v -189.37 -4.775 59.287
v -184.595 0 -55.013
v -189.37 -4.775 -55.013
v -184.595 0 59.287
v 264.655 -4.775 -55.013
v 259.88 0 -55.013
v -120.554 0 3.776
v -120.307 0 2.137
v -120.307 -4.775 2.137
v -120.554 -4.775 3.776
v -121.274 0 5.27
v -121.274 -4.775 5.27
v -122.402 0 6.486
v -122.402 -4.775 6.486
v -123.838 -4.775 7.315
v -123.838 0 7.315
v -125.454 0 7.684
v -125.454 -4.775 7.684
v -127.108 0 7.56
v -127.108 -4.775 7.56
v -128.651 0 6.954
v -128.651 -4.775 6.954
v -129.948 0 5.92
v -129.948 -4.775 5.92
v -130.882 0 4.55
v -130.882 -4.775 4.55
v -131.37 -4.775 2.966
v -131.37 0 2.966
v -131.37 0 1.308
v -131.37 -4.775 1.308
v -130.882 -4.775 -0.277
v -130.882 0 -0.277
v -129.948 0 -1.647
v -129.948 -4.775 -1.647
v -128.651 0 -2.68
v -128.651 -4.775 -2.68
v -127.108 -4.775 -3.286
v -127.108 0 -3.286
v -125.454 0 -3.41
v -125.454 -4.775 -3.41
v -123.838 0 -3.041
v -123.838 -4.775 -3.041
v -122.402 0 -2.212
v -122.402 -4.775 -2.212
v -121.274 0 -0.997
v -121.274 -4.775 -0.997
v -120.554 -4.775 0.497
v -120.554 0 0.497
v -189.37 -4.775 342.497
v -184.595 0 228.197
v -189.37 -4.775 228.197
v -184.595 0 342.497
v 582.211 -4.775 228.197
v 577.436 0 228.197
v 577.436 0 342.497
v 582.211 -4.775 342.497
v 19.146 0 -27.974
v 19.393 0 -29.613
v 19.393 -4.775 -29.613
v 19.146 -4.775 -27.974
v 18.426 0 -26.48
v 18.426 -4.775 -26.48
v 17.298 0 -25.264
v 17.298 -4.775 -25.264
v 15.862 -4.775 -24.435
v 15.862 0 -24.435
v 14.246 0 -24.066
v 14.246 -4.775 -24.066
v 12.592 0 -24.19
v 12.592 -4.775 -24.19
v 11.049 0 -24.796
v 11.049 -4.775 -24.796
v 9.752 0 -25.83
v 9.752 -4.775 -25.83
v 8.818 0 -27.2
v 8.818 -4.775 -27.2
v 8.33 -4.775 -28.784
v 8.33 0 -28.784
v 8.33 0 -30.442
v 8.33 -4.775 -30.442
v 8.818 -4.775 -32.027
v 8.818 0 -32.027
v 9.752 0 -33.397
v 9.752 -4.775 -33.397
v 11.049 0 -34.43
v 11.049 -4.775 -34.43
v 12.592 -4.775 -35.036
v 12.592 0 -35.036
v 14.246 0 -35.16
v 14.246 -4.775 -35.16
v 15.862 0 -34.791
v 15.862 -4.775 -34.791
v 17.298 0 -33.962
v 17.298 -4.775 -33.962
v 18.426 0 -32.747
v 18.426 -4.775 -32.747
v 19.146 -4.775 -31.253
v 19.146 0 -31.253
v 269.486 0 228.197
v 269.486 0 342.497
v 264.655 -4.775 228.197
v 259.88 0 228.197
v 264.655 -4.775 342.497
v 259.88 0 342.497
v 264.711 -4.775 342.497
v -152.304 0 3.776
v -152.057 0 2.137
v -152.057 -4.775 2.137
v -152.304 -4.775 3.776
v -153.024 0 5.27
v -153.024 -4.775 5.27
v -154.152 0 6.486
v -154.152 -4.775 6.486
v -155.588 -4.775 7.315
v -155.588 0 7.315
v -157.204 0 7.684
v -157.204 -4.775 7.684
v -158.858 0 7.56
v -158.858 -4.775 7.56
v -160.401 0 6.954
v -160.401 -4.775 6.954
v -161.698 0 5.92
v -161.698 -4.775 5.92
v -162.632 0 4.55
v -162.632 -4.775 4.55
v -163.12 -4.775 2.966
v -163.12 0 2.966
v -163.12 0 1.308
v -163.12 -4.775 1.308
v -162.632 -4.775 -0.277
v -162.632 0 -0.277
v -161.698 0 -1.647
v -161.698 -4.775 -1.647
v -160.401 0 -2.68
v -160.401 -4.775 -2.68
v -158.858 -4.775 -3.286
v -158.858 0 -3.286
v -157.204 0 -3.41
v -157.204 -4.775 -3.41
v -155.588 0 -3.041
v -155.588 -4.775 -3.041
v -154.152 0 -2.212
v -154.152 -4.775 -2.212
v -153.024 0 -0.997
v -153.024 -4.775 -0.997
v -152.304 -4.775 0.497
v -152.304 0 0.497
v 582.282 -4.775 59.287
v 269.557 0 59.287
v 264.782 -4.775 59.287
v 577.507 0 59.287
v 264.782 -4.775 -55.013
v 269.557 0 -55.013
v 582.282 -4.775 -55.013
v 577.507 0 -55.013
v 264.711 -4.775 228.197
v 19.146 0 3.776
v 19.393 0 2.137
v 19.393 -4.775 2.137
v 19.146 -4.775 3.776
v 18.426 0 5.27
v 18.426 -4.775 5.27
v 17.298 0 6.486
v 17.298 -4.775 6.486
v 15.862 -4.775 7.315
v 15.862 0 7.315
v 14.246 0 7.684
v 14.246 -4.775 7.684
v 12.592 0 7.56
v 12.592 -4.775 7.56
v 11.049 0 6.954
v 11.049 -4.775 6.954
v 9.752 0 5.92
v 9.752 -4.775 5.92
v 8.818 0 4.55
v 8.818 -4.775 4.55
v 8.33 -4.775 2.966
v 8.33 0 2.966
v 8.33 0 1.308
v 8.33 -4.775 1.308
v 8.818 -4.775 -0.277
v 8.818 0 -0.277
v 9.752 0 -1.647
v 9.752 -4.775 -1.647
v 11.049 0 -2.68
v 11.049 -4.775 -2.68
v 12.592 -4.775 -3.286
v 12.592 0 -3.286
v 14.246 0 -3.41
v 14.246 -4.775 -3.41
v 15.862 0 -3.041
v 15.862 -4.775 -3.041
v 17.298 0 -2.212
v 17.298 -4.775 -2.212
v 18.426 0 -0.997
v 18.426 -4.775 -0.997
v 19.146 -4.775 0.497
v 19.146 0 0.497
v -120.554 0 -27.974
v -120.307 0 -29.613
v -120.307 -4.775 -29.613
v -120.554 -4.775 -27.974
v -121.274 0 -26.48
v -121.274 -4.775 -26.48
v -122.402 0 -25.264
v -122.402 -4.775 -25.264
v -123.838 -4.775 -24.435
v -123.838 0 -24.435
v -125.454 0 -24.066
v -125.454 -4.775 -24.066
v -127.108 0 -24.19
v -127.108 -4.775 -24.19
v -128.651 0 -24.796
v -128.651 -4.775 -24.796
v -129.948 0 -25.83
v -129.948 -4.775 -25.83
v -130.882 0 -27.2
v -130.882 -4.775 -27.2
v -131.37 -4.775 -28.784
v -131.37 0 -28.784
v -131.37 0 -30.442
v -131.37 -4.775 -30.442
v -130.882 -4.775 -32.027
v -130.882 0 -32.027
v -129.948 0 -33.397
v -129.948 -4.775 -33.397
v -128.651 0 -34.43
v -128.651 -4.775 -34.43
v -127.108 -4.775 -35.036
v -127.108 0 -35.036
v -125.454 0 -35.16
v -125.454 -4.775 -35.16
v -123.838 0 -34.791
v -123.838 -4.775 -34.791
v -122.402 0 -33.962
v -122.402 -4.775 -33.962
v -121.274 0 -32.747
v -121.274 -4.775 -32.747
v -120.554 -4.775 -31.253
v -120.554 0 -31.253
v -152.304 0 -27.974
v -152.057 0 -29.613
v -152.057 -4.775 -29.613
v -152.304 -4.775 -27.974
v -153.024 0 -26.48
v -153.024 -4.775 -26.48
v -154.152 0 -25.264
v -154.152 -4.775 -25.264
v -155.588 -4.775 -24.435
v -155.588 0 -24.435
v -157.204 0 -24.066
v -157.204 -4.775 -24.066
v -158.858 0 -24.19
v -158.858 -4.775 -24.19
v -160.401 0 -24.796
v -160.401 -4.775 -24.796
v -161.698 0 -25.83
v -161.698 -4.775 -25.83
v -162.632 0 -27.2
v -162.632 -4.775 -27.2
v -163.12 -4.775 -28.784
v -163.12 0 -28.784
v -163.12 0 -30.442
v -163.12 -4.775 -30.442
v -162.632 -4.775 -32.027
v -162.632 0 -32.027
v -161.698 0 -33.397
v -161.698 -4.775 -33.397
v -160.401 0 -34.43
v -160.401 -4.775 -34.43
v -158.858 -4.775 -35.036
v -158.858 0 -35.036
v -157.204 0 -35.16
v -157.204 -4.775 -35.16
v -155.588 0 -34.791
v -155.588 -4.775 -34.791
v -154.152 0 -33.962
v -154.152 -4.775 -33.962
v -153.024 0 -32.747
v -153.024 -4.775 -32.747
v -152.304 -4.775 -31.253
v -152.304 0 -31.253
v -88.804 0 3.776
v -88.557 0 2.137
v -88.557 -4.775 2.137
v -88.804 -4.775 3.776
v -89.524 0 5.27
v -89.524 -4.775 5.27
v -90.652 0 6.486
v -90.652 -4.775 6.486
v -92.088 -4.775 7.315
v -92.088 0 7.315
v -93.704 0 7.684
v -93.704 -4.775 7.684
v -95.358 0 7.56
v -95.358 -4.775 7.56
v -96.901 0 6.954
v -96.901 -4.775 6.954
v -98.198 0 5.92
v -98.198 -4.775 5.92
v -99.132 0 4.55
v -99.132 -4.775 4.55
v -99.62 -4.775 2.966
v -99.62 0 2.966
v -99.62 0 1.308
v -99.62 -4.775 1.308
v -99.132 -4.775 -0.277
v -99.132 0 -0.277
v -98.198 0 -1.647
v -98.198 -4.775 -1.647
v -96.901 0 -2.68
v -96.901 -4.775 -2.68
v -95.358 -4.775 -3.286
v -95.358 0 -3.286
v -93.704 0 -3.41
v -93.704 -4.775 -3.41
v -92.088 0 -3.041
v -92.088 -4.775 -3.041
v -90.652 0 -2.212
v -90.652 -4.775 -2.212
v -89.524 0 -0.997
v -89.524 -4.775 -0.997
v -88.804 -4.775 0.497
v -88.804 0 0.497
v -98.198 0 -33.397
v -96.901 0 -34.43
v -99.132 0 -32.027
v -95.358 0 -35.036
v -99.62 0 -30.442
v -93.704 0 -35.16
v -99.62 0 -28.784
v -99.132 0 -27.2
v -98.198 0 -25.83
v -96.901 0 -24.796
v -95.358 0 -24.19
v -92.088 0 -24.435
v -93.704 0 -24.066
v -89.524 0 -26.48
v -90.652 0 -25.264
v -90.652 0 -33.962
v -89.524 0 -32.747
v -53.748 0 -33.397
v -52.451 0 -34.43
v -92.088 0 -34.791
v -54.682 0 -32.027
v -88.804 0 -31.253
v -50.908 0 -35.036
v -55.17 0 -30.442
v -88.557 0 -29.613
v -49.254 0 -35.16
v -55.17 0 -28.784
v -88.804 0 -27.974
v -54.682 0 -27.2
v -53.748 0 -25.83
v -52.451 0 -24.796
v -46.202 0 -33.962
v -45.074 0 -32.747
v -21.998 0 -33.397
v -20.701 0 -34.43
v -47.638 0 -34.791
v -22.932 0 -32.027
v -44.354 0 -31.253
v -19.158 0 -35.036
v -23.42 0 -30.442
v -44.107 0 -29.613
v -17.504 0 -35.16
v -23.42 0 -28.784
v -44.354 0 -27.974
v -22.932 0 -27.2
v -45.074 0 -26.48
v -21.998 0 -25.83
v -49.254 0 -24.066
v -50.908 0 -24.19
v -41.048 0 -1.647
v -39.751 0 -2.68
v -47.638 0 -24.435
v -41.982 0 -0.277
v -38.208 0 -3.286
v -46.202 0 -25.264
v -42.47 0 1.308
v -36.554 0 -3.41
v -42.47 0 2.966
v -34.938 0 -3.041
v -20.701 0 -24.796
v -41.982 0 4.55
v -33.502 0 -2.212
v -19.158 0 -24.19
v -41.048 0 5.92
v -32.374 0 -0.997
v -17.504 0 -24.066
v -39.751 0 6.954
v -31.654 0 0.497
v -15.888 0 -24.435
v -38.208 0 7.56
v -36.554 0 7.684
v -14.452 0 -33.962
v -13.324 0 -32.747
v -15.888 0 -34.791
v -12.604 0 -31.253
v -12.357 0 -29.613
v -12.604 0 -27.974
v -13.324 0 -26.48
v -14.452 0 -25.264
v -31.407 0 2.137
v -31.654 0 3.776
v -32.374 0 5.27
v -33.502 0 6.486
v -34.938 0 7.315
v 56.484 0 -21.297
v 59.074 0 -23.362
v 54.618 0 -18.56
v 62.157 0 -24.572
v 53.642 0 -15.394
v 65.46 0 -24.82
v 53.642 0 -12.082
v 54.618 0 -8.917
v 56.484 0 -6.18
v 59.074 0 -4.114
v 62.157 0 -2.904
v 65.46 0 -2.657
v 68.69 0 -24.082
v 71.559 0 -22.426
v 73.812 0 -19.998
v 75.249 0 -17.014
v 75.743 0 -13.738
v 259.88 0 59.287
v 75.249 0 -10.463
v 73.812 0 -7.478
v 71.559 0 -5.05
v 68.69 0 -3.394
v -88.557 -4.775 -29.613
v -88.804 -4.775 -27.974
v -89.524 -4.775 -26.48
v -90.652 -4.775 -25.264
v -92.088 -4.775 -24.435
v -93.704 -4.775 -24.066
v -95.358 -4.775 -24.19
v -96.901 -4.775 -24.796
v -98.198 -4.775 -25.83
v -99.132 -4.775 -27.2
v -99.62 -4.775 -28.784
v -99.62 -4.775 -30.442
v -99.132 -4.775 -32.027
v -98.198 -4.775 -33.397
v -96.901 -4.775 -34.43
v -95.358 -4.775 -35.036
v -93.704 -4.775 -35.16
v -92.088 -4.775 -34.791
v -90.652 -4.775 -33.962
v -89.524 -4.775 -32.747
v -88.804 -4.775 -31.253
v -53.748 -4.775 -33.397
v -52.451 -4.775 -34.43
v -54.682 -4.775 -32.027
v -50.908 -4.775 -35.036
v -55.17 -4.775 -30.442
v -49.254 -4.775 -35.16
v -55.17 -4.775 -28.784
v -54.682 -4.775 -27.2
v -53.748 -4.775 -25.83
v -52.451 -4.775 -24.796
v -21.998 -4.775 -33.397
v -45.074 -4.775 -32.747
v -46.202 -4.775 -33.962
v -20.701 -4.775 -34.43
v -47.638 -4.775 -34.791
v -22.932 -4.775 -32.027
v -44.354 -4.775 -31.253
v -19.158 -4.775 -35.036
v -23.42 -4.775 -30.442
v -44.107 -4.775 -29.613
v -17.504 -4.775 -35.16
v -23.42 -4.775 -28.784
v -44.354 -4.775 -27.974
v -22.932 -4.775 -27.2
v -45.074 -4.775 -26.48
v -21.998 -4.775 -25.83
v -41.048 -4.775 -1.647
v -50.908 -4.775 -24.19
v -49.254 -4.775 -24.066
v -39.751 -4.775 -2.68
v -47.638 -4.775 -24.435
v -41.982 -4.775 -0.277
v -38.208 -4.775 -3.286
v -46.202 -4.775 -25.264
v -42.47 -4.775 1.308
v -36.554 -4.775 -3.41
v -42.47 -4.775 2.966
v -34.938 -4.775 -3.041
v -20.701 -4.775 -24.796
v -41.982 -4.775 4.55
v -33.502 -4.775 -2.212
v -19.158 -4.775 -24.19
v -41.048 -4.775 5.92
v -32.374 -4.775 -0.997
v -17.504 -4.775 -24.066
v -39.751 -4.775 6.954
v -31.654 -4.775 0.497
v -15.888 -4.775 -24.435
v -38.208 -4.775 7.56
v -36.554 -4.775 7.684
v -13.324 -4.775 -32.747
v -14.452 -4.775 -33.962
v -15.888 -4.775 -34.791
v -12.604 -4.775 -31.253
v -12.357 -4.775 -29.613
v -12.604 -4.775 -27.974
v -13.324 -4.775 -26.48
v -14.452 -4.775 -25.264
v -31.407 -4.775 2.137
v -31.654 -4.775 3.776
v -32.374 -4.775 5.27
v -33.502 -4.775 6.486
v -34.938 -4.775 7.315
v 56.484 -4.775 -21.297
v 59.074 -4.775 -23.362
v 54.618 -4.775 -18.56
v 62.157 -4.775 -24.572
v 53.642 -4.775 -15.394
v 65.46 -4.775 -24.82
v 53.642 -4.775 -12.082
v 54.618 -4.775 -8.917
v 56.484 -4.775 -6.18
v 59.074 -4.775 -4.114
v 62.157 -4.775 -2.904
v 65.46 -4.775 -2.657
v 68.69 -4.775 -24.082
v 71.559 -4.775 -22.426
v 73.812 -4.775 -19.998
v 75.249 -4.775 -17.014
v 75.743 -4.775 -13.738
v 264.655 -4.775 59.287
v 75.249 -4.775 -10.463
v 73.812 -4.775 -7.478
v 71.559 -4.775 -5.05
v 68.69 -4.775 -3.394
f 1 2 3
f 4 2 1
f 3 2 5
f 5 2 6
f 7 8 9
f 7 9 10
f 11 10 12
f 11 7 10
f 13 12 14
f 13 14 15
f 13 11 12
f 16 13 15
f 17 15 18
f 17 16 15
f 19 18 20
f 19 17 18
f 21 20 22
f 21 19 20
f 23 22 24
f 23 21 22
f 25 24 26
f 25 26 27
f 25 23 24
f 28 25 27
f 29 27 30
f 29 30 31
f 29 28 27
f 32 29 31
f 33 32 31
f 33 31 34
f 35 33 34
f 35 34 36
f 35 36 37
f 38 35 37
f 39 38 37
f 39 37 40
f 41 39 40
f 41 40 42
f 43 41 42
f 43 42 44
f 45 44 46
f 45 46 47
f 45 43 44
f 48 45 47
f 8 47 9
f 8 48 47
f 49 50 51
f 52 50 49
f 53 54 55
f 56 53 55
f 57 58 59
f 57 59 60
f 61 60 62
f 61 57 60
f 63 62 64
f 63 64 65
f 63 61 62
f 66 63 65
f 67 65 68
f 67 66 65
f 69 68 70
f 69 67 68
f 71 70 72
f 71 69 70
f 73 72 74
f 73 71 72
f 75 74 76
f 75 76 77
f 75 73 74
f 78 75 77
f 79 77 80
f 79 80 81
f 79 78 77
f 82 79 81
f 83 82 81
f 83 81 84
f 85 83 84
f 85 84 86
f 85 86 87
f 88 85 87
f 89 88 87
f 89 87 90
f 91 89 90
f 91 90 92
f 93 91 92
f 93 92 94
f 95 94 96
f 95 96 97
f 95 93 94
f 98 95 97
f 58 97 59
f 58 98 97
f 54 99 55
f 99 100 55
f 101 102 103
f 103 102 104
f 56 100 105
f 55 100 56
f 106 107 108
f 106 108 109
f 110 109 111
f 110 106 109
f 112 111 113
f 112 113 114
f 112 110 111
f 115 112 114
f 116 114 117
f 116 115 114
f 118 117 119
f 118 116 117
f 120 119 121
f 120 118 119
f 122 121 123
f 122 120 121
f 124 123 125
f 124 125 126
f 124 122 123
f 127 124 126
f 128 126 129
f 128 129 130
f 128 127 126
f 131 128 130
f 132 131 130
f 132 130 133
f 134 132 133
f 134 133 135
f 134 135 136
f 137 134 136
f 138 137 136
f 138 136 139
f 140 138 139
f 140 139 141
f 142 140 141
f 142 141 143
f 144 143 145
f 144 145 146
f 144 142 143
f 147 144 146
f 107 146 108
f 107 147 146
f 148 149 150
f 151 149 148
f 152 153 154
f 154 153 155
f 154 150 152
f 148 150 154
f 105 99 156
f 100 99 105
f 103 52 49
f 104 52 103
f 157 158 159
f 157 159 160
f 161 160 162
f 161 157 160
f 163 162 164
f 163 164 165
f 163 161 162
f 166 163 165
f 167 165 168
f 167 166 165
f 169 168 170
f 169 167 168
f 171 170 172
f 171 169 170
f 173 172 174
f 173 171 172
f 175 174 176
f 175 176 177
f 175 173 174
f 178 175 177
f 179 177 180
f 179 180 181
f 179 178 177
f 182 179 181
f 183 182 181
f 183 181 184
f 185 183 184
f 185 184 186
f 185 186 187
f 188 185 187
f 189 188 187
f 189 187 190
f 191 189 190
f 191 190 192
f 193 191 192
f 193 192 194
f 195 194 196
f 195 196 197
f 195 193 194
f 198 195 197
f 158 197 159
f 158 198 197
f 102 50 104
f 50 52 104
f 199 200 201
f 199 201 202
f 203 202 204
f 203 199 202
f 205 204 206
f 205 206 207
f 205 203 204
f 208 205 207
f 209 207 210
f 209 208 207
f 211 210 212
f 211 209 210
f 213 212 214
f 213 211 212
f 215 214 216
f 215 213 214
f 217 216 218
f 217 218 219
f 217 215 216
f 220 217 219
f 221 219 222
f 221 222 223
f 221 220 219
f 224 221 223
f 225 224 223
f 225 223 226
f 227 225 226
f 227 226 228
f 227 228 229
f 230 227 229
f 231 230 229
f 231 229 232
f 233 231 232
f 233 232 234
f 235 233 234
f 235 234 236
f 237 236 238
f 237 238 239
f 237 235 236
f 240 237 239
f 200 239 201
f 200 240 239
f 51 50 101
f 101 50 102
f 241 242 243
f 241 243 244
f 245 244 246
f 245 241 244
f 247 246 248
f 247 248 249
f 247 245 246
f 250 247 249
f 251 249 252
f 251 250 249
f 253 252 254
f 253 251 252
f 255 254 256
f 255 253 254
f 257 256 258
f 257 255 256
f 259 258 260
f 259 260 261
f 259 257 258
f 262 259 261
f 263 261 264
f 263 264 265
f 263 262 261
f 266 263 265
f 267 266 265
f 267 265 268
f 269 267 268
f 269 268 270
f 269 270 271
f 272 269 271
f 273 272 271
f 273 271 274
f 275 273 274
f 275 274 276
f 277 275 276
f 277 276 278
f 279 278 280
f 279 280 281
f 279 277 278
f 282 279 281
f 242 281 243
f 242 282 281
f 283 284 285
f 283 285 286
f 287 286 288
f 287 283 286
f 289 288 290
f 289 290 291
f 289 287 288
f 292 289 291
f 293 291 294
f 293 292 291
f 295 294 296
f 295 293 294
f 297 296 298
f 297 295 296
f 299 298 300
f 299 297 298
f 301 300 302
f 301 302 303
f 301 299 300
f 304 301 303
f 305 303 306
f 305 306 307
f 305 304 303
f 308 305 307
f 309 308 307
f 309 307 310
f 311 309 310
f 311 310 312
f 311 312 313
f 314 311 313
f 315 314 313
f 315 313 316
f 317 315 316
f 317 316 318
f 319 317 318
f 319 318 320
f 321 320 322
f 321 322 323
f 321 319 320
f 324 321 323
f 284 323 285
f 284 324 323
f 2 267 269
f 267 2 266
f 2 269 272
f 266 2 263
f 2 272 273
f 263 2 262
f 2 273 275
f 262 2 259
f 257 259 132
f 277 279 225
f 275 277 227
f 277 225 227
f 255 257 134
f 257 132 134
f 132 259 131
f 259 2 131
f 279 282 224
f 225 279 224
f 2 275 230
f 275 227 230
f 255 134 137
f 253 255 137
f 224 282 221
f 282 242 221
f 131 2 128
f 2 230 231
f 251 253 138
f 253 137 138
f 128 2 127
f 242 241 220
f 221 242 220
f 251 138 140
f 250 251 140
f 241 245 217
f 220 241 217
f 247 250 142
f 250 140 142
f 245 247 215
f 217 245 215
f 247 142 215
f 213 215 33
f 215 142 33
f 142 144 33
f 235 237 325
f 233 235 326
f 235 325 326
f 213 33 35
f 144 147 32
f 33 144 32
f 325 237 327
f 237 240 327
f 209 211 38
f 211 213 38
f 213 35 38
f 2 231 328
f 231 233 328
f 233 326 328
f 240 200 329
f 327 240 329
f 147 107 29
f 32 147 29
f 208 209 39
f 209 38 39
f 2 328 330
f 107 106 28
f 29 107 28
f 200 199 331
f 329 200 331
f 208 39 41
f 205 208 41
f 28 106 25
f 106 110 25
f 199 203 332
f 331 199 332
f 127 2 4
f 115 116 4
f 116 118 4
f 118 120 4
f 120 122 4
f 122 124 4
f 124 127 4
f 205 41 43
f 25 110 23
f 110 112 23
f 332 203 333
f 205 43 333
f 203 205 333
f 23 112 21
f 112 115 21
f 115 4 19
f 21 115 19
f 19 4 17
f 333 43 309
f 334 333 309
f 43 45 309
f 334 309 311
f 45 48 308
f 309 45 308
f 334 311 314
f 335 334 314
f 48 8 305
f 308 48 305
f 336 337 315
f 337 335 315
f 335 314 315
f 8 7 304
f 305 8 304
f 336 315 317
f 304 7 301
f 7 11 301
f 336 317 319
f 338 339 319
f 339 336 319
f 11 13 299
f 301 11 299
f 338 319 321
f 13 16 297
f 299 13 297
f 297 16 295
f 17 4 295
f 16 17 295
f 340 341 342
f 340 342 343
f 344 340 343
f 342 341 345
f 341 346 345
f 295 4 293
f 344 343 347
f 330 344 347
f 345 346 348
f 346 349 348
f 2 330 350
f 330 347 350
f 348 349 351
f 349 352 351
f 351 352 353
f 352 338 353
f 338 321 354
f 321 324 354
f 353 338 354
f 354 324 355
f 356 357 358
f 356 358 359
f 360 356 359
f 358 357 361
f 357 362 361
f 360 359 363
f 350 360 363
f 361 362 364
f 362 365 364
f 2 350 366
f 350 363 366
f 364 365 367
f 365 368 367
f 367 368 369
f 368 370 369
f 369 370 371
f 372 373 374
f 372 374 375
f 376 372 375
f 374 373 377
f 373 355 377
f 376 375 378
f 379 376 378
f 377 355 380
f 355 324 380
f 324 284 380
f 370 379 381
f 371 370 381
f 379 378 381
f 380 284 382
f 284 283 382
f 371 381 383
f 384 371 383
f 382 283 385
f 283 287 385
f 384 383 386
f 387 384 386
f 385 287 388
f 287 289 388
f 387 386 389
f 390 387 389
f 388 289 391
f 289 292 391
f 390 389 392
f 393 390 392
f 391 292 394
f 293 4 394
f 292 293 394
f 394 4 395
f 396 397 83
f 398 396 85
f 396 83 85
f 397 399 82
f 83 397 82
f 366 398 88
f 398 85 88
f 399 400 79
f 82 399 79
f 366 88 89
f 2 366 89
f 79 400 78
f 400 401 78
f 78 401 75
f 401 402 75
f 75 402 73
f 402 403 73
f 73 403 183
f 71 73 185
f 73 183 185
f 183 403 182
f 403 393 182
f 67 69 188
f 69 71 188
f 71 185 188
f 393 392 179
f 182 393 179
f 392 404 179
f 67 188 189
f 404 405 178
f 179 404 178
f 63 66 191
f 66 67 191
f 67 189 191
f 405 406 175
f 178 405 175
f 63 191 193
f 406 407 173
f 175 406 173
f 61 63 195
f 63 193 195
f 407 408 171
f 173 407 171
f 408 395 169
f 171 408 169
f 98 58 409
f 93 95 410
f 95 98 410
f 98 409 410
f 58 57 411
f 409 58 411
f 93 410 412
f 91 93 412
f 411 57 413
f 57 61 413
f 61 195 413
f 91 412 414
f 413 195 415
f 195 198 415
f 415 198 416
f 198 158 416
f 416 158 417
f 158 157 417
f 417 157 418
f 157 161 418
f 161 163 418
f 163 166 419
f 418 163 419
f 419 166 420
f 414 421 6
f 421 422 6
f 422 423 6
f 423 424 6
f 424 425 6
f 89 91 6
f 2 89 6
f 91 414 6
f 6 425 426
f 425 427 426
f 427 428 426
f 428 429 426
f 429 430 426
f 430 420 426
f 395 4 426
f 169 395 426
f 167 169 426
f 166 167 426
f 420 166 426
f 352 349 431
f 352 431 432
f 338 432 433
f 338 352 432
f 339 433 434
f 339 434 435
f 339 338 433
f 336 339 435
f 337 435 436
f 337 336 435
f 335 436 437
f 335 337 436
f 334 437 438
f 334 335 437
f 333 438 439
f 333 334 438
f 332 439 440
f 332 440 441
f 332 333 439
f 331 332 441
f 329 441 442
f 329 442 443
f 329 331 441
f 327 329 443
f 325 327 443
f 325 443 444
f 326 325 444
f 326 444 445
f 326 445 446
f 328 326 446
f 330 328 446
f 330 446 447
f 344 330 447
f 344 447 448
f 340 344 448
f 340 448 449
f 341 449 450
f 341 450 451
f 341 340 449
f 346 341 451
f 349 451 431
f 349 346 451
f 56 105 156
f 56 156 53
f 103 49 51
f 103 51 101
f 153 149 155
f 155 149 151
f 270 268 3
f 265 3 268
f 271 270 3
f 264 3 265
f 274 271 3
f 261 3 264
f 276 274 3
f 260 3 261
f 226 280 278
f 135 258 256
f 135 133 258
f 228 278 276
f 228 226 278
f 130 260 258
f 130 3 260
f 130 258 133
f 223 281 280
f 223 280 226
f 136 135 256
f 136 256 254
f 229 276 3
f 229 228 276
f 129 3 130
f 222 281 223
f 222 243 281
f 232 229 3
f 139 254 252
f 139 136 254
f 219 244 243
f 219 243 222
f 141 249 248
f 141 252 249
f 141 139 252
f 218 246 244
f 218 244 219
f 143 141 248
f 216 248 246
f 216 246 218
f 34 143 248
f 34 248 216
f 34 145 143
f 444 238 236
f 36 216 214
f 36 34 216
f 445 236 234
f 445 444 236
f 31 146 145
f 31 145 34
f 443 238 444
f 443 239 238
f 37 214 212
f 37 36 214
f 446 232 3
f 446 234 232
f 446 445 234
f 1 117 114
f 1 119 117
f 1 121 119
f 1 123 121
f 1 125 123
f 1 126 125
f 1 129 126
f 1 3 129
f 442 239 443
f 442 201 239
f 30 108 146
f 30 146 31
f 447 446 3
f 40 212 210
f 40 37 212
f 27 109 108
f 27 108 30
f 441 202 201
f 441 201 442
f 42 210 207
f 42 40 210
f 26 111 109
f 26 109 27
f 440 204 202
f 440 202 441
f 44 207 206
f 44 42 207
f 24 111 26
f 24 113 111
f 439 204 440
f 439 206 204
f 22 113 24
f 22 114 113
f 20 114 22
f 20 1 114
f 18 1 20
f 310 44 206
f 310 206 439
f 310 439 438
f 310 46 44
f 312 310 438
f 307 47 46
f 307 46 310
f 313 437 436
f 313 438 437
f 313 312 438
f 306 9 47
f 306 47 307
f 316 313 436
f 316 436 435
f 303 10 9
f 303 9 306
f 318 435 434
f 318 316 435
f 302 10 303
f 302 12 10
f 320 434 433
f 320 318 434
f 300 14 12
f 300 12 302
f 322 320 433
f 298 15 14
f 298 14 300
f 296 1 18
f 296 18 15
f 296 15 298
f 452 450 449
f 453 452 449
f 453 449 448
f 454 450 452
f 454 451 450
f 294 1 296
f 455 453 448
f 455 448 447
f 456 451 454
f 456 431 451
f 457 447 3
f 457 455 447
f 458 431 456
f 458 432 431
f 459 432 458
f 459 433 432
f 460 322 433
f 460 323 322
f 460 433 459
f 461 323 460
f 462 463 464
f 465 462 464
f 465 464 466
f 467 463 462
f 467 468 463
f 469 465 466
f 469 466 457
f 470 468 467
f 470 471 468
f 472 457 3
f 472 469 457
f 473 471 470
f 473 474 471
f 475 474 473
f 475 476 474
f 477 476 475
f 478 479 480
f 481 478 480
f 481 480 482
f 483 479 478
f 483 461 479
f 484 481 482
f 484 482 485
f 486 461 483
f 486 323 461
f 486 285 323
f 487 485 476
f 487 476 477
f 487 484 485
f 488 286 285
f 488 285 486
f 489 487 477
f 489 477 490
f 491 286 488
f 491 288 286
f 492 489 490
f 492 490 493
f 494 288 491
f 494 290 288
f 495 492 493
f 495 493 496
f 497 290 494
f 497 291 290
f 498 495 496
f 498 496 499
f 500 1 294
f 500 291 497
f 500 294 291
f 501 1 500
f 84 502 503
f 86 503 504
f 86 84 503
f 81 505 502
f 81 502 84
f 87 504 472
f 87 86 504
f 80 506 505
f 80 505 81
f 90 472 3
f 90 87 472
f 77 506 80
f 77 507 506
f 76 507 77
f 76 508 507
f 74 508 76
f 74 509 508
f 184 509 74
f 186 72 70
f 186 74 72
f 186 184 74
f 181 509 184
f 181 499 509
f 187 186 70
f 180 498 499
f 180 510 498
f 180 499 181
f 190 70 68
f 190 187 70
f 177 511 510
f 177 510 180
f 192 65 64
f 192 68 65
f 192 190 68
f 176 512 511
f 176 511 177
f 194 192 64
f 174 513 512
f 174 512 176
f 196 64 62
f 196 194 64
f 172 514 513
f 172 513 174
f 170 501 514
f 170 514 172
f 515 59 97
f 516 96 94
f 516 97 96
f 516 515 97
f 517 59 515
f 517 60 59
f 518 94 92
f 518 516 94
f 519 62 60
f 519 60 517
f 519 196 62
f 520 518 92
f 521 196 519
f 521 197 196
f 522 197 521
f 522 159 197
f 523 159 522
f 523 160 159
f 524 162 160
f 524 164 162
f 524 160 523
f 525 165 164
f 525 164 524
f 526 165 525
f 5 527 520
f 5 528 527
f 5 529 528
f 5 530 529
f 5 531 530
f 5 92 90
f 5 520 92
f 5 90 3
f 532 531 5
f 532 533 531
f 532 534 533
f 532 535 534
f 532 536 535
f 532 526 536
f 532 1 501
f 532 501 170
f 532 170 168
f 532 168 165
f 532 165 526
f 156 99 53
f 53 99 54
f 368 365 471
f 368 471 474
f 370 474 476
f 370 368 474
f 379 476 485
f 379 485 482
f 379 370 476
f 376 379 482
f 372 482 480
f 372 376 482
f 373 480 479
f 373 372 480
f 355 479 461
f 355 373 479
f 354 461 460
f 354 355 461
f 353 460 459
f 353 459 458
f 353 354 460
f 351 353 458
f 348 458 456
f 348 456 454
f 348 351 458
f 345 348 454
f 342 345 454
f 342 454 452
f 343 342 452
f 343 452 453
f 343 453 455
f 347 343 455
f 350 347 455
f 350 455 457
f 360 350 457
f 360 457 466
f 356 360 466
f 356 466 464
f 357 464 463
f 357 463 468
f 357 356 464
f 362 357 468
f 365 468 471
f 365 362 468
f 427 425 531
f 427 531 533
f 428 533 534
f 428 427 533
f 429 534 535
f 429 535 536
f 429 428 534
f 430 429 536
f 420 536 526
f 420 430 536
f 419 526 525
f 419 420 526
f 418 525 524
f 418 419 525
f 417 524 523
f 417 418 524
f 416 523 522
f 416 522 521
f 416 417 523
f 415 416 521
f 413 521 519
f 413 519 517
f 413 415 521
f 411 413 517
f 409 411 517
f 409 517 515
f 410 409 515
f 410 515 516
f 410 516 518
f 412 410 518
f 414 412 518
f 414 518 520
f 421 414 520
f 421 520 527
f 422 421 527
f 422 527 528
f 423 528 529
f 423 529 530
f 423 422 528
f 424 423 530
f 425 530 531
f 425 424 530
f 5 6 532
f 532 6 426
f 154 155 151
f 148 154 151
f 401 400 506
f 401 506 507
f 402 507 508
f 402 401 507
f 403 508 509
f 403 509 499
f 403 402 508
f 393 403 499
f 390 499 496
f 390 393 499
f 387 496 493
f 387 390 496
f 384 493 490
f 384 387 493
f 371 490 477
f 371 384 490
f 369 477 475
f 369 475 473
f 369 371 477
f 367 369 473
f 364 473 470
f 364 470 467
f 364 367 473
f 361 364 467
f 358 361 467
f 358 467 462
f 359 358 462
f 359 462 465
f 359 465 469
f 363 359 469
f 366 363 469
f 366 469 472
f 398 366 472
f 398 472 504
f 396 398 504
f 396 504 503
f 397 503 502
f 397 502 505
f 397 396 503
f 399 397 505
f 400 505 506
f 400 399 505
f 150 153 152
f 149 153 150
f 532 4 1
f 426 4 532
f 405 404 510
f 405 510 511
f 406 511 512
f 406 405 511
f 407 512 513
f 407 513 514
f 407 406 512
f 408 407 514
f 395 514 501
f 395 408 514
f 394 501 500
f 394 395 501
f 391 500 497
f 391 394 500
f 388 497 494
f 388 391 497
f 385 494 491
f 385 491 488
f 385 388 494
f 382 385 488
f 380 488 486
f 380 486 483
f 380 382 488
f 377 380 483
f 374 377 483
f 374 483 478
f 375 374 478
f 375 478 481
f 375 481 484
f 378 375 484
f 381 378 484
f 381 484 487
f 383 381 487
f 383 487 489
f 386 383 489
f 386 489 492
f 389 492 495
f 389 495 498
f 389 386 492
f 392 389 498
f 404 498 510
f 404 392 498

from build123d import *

# Parameters (mm, degrees)
F0_W      = 454.025
F0_H      = 114.3
F0_R      = 5.5626
F0_R_2    = 11.1125
F1_DEPTH  = 4.7752
F0_W_2    = 317.5
F2_SIZE   = 4.77519
F2_2_SIZE = 4.77519
F2_3_SIZE = 4.77519
F2_4_SIZE = 4.77519


# Not quite as in the source:
# - a fillet or chamfer is up to 0.001 mm smaller than in the source, because OpenCascade refuses the exact size
# - a feature names something its author has since deleted; it is built from what else it names


with BuildPart() as f1:
    # F0 (on Front) → F1 (new body)
    with BuildSketch(Plane.XZ):
        with Locations((37.6425363503, 2.1368730813)):
            Rectangle(F0_W, F0_H)
        with Locations((-157.6199636497, -29.6131269187)):
            Circle(F0_R, mode=Mode.SUBTRACT)
        with Locations((-125.8699636497, -29.6131269187)):
            Circle(F0_R, mode=Mode.SUBTRACT)
        with Locations((-94.1199636497, -29.6131269187)):
            Circle(F0_R, mode=Mode.SUBTRACT)
        with Locations((-49.6699636497, -29.6131269187)):
            Circle(F0_R, mode=Mode.SUBTRACT)
        with Locations((-17.9199636497, -29.6131269187)):
            Circle(F0_R, mode=Mode.SUBTRACT)
        with Locations((-157.6199636497, 2.1368730813)):
            Circle(F0_R, mode=Mode.SUBTRACT)
        with Locations((-125.8699636497, 2.1368730813)):
            Circle(F0_R, mode=Mode.SUBTRACT)
        with Locations((-94.1199636497, 2.1368730813)):
            Circle(F0_R, mode=Mode.SUBTRACT)
        with Locations((-36.9699636497, 2.1368730813)):
            Circle(F0_R, mode=Mode.SUBTRACT)
        with Locations((13.8300363503, -29.6131269187)):
            Circle(F0_R, mode=Mode.SUBTRACT)
        with Locations((64.6300363503, -13.7381269187)):
            Circle(F0_R_2, mode=Mode.SUBTRACT)
        with Locations((13.8300363503, 2.1368730813)):
            Circle(F0_R, mode=Mode.SUBTRACT)
    extrude(amount=F1_DEPTH)

    # F2#2 (size 4.7752 in the source; OpenCascade refuses exactly that, so slightly less here)
    f2_2_edges = [f1.edges().sort_by_distance(p)[0] for p in [
        (264.655036, 0, 2.136873),
        (-189.369964, 0, 2.136873),
    ]]
    chamfer(f2_2_edges, length=F2_2_SIZE)


with BuildPart() as f1b:
    # F0 (on Front) → F1, piece 2 (new body)
    with BuildSketch(Plane.XZ):
        with Locations((37.6425363503, 285.3470083714)):
            Rectangle(F0_W, F0_H)
    extrude(amount=F1_DEPTH)

    # F2 (size 4.7752 in the source; OpenCascade refuses exactly that, so slightly less here)
    f2_edges = [f1b.edges().sort_by_distance(p)[0] for p in [
        (264.655036, 0, 285.347008),
        (-189.369964, 0, 285.347008),
    ]]
    chamfer(f2_edges, length=F2_SIZE)


with BuildPart() as f1c:
    # F0 (on Front) → F1, piece 3 (new body)
    with BuildSketch(Plane.XZ):
        with Locations((423.5320413113, 2.1368730813)):
            Rectangle(F0_W_2, F0_H)
    extrude(amount=F1_DEPTH)

    # F2#3 (size 4.7752 in the source; OpenCascade refuses exactly that, so slightly less here)
    f2_3_edges = [f1c.edges().sort_by_distance(p)[0] for p in [
        (582.282041, 0, 2.136873),
        (264.782041, 0, 2.136873),
    ]]
    chamfer(f2_3_edges, length=F2_3_SIZE)


with BuildPart() as f1d:
    # F0 (on Front) → F1, piece 4 (new body)
    with BuildSketch(Plane.XZ):
        with Locations((423.4609160386, 285.3470083714)):
            Rectangle(F0_W_2, F0_H)
    extrude(amount=F1_DEPTH)

    # F2#4 (size 4.7752 in the source; OpenCascade refuses exactly that, so slightly less here)
    f2_4_edges = [f1d.edges().sort_by_distance(p)[0] for p in [
        (264.710916, 0, 285.347008),
        (582.210916, 0, 285.347008),
    ]]
    chamfer(f2_4_edges, length=F2_4_SIZE)


solid = Compound([f1.part, f1b.part, f1c.part, f1d.part])
